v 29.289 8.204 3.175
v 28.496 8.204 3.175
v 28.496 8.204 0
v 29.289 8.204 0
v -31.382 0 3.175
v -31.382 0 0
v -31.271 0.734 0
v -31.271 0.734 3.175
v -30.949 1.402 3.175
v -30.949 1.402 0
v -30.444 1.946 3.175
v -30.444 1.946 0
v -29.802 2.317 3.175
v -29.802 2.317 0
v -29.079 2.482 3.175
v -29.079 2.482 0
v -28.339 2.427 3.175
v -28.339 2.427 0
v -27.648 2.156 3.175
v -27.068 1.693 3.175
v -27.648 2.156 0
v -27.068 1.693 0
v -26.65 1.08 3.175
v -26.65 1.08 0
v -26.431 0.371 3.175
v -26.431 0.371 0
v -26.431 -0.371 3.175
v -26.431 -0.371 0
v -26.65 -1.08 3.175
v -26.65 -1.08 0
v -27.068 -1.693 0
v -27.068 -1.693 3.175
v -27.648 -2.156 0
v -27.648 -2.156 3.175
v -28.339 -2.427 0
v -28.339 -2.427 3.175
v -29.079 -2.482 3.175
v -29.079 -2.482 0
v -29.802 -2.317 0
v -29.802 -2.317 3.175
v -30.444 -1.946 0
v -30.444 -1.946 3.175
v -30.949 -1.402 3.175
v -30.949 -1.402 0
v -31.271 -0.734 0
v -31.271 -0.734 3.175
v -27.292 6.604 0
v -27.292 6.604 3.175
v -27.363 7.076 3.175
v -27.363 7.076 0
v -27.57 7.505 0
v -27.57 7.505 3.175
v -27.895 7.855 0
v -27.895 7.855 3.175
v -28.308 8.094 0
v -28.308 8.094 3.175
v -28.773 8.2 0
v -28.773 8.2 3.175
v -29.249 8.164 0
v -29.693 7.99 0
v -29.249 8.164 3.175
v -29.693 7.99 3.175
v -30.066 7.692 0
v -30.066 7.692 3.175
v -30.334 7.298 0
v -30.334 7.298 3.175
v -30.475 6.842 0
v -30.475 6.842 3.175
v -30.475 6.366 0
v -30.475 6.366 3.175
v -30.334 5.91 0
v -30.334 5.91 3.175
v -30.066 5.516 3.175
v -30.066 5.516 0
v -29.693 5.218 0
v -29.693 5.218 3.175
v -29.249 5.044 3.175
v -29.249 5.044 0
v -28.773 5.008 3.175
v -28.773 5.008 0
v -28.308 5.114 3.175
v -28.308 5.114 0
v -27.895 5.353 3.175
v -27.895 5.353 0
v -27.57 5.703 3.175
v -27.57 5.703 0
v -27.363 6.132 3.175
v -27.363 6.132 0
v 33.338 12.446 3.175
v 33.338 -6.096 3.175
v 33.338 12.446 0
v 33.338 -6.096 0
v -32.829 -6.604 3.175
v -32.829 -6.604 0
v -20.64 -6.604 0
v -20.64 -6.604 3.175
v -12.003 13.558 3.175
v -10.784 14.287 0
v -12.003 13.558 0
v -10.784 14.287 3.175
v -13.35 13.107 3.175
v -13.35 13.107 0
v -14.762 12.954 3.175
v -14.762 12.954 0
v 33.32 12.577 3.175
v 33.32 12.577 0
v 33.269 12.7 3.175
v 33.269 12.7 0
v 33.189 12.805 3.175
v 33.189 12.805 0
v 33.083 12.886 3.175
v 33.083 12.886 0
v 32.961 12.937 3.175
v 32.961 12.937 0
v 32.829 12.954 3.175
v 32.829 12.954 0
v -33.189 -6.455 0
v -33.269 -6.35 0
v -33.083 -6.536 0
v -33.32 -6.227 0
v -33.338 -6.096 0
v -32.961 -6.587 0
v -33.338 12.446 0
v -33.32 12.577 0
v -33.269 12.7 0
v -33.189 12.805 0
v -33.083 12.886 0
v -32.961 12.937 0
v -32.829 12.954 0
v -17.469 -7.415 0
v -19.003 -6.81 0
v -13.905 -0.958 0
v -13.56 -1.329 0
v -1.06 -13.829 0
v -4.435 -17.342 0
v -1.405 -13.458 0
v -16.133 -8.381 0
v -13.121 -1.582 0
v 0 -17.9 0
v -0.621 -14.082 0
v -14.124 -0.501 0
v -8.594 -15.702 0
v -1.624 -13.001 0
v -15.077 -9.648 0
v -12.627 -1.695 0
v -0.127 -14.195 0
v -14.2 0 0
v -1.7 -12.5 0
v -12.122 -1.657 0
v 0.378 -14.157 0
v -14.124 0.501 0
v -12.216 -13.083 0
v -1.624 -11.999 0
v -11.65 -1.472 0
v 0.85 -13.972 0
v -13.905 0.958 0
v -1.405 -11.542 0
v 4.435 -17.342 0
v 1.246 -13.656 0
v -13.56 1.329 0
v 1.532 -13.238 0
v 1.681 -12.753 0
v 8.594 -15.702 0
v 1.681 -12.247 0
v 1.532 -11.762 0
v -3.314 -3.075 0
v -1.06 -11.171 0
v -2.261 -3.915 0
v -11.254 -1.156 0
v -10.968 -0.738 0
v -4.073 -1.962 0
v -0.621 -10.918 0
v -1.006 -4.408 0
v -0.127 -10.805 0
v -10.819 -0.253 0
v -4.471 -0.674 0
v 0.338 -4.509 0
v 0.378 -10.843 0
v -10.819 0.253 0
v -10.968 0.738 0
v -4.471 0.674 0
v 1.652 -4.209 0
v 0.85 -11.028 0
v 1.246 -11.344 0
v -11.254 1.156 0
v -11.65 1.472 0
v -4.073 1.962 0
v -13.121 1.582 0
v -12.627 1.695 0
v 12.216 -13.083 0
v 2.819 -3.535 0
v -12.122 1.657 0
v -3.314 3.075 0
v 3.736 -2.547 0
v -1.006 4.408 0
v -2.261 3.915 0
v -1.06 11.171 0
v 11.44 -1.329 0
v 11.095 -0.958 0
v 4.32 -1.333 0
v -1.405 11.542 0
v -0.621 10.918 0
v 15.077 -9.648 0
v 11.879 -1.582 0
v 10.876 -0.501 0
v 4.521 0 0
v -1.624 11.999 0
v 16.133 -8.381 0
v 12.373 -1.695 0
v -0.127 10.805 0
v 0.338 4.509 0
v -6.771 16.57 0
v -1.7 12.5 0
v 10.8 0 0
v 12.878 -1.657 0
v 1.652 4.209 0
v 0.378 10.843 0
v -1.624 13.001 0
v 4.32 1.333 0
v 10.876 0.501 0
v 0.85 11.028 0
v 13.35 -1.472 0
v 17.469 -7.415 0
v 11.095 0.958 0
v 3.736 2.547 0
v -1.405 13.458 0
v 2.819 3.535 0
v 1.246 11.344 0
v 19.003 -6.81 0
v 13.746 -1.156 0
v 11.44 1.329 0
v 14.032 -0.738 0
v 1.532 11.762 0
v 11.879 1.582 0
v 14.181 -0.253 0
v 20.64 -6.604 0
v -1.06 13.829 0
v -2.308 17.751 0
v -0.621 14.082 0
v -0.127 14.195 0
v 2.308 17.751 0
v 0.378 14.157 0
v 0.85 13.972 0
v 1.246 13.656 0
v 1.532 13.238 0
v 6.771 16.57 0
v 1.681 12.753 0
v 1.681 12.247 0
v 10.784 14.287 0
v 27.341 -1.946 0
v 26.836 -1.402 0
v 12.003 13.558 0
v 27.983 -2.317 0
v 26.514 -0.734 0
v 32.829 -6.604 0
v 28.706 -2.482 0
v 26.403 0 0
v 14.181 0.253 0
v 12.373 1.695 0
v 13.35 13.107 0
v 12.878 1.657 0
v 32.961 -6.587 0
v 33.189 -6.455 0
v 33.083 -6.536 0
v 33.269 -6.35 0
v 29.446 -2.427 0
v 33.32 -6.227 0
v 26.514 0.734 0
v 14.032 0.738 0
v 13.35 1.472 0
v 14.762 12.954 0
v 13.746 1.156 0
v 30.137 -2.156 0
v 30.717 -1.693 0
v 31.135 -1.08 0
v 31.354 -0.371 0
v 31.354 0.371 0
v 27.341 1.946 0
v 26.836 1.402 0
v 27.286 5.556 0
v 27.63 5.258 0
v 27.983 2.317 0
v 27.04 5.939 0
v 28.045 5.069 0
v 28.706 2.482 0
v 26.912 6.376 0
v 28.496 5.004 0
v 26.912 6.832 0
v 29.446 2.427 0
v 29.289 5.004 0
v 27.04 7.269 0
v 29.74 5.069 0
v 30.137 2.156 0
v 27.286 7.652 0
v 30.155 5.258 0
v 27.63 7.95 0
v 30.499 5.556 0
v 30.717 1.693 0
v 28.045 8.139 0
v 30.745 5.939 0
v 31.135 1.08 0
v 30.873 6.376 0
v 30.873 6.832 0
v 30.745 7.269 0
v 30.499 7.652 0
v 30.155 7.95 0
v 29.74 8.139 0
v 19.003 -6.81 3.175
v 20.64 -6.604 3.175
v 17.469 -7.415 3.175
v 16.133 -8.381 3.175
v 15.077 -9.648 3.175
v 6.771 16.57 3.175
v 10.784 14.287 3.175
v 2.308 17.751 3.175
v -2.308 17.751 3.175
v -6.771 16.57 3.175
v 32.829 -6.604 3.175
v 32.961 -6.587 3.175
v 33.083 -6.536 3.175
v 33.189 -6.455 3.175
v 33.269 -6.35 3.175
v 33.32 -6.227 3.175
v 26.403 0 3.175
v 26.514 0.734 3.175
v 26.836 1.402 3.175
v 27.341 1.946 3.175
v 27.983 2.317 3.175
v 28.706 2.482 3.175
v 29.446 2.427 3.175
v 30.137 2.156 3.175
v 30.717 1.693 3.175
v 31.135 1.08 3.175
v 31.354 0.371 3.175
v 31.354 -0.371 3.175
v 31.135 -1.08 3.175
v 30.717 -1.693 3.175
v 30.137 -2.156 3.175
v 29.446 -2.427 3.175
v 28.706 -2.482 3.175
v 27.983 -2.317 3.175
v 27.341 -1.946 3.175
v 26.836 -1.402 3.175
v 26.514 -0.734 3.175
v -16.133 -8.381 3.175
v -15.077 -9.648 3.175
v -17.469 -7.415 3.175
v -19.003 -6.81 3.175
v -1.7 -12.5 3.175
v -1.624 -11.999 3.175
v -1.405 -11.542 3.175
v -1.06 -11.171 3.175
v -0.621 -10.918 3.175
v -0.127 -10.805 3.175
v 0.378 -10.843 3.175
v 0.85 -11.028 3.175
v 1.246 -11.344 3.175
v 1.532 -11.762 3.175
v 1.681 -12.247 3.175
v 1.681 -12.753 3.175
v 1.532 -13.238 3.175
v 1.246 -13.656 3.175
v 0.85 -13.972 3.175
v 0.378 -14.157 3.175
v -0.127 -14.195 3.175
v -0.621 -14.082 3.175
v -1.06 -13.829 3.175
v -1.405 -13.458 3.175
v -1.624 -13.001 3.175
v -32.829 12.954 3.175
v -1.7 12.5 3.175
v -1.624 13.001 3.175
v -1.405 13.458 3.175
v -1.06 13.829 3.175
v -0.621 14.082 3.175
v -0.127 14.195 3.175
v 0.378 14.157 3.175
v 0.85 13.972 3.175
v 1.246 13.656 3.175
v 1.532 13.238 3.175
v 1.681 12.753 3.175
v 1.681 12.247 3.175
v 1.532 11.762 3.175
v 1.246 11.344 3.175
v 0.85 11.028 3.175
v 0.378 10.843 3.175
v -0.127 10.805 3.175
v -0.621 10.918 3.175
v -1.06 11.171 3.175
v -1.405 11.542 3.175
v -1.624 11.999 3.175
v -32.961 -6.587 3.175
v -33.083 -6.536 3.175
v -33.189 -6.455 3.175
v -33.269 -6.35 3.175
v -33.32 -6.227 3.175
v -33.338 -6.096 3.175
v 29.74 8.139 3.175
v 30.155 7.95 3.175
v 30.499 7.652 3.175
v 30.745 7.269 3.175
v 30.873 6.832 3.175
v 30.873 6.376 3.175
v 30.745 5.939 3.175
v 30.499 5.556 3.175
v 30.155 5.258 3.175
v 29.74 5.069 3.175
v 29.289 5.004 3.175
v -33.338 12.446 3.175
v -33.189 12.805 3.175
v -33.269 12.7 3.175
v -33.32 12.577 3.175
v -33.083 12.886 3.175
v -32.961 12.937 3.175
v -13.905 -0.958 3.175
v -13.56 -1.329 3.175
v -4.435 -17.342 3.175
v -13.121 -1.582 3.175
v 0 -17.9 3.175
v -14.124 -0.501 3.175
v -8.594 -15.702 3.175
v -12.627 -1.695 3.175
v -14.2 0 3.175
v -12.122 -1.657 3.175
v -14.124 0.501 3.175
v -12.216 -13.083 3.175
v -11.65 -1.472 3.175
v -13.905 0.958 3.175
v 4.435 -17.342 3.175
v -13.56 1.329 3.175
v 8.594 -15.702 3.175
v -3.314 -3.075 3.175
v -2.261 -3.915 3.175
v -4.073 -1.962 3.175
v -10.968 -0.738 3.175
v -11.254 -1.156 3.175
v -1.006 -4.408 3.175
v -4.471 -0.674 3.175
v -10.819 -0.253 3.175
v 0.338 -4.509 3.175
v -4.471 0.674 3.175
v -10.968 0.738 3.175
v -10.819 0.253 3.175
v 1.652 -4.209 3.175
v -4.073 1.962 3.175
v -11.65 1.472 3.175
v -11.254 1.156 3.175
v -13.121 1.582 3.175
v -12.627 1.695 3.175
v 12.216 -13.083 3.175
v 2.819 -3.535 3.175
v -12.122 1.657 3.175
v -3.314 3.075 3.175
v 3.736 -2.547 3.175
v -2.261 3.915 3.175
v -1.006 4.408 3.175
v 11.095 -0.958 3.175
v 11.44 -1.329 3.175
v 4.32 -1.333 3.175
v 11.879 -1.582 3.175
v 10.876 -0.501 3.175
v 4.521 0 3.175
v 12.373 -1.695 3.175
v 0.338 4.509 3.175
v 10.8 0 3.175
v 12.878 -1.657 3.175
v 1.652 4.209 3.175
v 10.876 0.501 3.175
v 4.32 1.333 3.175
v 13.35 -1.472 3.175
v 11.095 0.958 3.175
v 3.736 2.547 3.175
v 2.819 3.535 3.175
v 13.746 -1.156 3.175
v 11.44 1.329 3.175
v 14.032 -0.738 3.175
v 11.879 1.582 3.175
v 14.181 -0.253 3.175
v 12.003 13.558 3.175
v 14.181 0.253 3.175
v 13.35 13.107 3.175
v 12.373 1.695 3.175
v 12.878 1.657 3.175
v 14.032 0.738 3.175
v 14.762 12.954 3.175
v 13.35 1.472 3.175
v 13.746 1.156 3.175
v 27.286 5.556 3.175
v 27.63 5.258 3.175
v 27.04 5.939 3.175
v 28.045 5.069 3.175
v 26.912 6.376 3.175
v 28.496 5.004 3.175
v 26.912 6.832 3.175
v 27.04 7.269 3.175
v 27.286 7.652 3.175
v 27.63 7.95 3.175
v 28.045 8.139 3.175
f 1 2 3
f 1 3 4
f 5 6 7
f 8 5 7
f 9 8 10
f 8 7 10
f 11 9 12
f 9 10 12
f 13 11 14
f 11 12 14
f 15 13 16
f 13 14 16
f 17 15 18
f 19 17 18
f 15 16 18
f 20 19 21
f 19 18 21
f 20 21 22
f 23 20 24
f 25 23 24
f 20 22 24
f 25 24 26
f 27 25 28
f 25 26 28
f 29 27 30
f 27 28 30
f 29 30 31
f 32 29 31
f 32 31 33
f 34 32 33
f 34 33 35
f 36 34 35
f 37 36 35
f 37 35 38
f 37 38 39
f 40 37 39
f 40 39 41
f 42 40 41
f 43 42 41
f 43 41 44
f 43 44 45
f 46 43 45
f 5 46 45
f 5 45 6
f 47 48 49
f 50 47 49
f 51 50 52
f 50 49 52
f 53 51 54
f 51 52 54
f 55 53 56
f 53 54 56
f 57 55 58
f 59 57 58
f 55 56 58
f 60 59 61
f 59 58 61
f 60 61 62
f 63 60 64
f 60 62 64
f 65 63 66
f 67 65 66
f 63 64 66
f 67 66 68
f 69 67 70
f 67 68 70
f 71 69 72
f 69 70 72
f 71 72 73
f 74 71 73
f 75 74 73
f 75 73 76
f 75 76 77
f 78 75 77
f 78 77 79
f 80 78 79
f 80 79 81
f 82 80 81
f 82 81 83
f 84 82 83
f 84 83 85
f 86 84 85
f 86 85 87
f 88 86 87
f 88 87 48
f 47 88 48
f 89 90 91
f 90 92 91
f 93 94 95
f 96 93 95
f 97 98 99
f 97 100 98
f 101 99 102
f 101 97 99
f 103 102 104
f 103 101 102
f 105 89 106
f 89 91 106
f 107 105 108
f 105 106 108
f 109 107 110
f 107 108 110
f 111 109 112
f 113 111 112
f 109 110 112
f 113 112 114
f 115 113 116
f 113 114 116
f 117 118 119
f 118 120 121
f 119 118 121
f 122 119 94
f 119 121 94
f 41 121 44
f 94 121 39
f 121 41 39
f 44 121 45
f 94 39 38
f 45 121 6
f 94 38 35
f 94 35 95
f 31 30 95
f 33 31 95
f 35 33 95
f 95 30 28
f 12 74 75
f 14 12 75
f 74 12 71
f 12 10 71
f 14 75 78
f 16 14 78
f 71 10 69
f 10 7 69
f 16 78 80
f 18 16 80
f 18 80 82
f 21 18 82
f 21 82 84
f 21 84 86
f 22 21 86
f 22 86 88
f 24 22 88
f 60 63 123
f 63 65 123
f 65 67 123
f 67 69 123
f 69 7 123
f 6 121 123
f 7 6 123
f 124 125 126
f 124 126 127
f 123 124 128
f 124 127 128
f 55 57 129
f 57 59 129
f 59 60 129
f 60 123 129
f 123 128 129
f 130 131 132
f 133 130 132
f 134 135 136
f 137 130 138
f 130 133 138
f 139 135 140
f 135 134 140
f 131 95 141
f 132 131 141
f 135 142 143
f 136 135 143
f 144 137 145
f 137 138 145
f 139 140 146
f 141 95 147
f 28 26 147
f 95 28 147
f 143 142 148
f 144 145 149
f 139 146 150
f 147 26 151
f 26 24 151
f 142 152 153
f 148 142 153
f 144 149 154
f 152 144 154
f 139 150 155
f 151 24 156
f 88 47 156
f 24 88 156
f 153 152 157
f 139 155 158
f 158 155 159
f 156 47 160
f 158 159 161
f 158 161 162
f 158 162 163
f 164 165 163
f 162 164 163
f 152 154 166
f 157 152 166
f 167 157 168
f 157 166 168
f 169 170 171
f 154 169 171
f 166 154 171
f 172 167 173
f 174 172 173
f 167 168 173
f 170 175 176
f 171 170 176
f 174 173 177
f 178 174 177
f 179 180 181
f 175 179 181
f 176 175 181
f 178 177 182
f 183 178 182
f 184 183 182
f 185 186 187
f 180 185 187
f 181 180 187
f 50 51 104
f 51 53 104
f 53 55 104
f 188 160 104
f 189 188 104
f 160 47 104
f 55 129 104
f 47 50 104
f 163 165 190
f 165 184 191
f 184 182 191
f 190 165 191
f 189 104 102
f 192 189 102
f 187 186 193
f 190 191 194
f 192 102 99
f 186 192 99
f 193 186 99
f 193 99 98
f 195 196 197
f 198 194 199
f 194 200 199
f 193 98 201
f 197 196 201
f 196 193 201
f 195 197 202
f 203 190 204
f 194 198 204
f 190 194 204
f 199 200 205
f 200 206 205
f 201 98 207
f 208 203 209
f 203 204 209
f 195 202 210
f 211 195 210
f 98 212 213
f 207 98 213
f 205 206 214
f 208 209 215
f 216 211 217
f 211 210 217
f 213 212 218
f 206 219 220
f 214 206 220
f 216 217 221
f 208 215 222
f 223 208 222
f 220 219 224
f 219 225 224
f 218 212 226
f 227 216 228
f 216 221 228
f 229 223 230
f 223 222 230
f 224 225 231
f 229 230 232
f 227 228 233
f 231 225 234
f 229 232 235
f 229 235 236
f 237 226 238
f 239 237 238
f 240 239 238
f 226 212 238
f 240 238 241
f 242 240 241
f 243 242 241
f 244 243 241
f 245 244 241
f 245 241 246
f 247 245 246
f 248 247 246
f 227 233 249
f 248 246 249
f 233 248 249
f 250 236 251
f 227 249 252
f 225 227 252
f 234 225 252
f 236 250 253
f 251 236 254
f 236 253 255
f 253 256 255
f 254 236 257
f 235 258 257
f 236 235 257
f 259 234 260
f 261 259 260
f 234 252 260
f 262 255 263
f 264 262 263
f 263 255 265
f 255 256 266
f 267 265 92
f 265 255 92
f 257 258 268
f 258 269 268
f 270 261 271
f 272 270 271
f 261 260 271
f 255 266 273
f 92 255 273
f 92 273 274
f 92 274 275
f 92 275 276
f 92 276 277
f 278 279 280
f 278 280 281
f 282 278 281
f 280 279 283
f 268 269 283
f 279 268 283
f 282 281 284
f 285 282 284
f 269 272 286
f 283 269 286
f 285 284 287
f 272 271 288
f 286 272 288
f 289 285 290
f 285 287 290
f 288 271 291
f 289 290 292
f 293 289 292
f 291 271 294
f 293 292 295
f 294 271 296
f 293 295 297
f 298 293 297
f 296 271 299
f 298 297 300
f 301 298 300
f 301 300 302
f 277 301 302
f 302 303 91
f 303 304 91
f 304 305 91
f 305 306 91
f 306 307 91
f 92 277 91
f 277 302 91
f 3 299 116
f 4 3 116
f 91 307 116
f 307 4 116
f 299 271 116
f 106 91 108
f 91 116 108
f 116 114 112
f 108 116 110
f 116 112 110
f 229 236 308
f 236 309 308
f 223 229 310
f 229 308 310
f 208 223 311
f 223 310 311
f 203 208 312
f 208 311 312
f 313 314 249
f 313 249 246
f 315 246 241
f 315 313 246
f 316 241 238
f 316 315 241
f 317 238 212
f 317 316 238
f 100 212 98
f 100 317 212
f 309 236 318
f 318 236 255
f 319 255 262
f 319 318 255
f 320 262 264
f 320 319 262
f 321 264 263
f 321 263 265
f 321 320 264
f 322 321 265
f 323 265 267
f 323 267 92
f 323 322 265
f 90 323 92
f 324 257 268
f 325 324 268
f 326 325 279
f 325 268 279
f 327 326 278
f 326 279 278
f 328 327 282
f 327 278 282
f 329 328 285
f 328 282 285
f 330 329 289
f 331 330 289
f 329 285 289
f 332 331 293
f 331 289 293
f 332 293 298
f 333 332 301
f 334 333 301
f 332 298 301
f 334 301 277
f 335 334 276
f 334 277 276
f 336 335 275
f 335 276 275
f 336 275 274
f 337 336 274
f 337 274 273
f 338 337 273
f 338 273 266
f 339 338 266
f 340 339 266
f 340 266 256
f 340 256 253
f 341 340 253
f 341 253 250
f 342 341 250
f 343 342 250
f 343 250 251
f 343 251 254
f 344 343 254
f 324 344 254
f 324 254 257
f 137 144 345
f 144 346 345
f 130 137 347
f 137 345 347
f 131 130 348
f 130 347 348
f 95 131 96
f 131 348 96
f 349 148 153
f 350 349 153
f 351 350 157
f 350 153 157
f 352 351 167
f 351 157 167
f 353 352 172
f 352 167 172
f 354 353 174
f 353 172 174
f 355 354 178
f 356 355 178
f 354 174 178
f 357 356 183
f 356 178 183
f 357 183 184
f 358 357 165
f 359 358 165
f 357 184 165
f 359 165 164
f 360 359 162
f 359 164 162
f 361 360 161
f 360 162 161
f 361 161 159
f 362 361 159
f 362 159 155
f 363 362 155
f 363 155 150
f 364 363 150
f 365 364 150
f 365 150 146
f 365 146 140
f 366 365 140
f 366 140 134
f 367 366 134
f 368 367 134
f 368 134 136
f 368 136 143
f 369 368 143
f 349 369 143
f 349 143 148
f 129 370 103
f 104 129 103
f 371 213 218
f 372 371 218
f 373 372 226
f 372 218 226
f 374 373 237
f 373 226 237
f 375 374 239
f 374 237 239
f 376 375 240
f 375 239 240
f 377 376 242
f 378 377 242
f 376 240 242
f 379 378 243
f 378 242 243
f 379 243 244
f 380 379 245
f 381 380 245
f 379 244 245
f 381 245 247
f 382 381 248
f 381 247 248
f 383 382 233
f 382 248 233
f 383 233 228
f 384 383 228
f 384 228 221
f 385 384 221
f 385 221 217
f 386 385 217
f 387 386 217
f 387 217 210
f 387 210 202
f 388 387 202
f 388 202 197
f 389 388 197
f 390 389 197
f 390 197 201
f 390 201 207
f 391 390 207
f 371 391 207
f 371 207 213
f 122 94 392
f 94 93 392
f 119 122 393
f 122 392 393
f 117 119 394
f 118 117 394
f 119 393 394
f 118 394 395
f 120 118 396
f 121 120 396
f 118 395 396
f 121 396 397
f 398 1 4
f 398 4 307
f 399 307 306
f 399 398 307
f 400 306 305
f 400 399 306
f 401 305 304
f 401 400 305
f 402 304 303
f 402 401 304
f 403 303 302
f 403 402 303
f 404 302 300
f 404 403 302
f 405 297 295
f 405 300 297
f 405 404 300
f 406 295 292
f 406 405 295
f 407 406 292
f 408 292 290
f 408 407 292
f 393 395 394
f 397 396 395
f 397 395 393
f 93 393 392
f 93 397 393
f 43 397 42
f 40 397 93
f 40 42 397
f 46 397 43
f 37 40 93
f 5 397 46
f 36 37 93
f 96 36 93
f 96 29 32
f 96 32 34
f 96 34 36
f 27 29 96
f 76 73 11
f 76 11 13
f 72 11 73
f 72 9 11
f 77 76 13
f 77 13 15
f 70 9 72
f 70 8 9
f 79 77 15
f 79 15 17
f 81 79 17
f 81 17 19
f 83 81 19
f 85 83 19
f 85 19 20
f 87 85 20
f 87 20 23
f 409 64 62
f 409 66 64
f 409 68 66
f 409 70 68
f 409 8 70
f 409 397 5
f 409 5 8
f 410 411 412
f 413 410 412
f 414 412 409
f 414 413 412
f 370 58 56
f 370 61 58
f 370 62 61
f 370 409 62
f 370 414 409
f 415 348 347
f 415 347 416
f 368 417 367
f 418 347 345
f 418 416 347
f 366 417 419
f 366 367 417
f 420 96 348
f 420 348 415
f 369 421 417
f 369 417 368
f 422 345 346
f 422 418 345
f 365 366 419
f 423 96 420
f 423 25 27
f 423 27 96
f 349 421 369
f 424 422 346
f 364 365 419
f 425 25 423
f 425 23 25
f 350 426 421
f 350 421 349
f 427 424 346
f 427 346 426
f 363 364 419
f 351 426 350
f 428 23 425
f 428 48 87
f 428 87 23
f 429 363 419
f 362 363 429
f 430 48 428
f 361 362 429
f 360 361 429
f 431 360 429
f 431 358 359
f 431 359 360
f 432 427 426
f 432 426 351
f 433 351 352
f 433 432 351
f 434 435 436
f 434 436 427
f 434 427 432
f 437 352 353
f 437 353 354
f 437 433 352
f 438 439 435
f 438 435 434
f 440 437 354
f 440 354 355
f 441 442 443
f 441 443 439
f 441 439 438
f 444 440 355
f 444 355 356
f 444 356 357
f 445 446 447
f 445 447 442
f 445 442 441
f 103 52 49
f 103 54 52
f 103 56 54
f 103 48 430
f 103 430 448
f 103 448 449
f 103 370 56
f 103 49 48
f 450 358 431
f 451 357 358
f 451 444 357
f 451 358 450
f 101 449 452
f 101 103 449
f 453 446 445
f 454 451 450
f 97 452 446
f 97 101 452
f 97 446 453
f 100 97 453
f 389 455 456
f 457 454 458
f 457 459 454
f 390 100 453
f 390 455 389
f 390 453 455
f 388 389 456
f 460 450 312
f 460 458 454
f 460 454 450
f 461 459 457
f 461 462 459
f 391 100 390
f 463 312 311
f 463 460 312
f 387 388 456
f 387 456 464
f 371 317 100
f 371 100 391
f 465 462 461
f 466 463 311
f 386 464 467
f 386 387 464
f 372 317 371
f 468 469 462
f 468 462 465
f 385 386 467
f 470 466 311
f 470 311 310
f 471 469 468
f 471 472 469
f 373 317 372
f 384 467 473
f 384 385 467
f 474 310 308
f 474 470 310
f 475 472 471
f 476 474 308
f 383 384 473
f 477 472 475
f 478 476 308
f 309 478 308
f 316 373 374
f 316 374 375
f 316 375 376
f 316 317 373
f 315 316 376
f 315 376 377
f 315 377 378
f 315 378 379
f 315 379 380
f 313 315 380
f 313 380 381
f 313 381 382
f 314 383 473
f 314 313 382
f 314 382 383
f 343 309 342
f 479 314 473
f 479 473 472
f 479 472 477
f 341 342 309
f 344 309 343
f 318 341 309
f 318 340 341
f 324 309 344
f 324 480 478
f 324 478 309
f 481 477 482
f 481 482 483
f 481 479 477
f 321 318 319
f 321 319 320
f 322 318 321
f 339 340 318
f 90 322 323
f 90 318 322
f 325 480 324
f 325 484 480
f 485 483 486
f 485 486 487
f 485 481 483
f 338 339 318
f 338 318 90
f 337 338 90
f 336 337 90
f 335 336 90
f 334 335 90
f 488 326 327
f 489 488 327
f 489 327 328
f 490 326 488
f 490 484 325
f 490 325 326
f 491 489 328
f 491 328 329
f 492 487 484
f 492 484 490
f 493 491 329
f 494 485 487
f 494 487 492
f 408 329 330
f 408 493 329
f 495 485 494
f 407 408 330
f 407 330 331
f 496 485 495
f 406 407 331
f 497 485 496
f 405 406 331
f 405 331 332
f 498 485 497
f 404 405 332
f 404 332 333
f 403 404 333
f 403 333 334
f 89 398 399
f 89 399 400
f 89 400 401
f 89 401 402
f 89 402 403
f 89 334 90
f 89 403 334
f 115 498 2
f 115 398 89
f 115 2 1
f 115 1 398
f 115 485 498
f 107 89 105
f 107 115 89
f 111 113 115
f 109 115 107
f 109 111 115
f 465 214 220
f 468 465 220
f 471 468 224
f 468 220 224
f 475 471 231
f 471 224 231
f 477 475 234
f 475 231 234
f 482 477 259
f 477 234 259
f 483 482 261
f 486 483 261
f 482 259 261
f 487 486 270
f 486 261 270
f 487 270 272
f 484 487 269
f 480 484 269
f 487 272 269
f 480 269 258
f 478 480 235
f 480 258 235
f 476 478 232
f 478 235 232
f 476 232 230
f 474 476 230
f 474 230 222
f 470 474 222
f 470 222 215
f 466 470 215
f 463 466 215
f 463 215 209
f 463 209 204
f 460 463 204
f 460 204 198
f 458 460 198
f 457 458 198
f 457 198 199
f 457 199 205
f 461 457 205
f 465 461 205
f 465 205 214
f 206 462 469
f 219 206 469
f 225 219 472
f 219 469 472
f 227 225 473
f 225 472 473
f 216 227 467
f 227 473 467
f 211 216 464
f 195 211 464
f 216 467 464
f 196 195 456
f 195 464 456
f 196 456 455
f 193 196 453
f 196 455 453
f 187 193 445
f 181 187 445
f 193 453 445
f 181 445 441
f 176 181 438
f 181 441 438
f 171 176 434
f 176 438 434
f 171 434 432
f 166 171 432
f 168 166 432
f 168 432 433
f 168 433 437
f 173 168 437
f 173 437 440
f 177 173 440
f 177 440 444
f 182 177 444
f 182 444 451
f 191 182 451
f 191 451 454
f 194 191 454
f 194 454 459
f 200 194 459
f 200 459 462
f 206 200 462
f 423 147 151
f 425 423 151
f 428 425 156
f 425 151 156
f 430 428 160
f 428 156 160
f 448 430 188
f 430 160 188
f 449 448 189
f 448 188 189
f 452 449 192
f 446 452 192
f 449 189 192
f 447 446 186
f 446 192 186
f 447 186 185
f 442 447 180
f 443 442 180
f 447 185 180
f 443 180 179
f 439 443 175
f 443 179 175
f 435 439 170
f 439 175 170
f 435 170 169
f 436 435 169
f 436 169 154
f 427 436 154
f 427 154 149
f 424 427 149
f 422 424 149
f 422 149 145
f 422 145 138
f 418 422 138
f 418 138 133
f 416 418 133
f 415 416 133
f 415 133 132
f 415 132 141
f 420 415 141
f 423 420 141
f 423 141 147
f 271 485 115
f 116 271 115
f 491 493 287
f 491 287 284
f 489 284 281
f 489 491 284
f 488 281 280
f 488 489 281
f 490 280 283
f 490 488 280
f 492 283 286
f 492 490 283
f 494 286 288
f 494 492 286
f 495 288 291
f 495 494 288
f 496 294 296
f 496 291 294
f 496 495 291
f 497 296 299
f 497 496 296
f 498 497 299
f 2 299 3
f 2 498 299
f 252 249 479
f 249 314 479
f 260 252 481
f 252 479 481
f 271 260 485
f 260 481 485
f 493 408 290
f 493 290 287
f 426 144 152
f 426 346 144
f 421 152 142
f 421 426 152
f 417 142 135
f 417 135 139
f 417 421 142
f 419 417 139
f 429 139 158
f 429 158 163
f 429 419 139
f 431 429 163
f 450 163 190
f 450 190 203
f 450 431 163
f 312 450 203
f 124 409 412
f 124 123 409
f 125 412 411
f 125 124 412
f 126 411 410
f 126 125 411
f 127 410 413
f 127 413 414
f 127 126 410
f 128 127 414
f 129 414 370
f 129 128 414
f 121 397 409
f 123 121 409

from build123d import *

# Parameters (mm, degrees)
SKETCH1_W              = 66.675
SKETCH1_H              = 13.208
BOSS_EXTRUDE1_DEPTH    = 3.175
SKETCH2_R              = 17.9
BOSS_EXTRUDE2_DEPTH    = 3.175
SKETCH8_W              = 66.675
SKETCH8_H              = 6.35
BOSS_EXTRUDE3_DEPTH    = 3.175
FILLET1_R              = 6.604
FILLET2_R              = 0.508
F_10_CLEARANCE_HOLE1_D = 4.9784
SKETCH5_R              = 4.5212
CUT_EXTRUDE1_DEPTH     = 38.972088845
M3_CLEARANCE_HOLE1_D   = 3.4
SKETCH9_R              = 1.6002
CUT_EXTRUDE2_DEPTH     = 38.972088845


with BuildPart() as part:
    # Sketch1 → Boss-Extrude1 (new body)
    with BuildSketch(Plane.XY):
        Rectangle(SKETCH1_W, SKETCH1_H)
    extrude(amount=BOSS_EXTRUDE1_DEPTH)

    # Sketch2 → Boss-Extrude2 (add, through all)
    with BuildSketch(Plane.XY.offset(3.175)):
        Circle(SKETCH2_R)
    extrude(amount=-BOSS_EXTRUDE2_DEPTH)

    # Sketch8 → Boss-Extrude3 (add, through all)
    with BuildSketch(Plane.XY.offset(3.175)):
        with Locations((0, 9.779)):
            Rectangle(SKETCH8_W, SKETCH8_H)
    extrude(amount=-BOSS_EXTRUDE3_DEPTH)

    # Fillet1
    fillet1_edges = [part.edges().sort_by_distance(p)[0] for p in [
        (-16.637222845, -6.604, 1.5875),
        (16.637222845, -6.604, 1.5875),
        (12.353294459, 12.954, 1.5875),
        (-12.353294459, 12.954, 1.5875),
    ]]
    fillet(fillet1_edges, radius=FILLET1_R)

    # Fillet2
    fillet2_edges = [part.edges().sort_by_distance(p)[0] for p in [
        (-33.3375, 12.954, 1.5875),
        (33.3375, 12.954, 1.5875),
        (33.3375, -6.604, 1.5875),
        (-33.3375, -6.604, 1.5875),
    ]]
    fillet(fillet2_edges, radius=FILLET2_R)

    # #10 Clearance Hole1 (through all)
    with Locations(Plane.XY.offset(3.175)):
        with Locations((28.8925, 0), (-28.8925, 0)):
            Hole(F_10_CLEARANCE_HOLE1_D / 2)

    # Sketch5 → Cut-Extrude1 (cut, through all)
    with BuildSketch(Plane.XY.offset(3.175)):
        Circle(SKETCH5_R)
    extrude(amount=-CUT_EXTRUDE1_DEPTH, mode=Mode.SUBTRACT)

    # M3 Clearance Hole1 (through all)
    with Locations(Plane.XY.offset(3.175)):
        with Locations((0, 12.5), (-12.5, 0), (0, -12.5), (12.5, 0)):
            Hole(M3_CLEARANCE_HOLE1_D / 2)

    # Sketch9 → Cut-Extrude2 (cut, through all)
    with BuildSketch(Plane.XY.offset(3.175)):
        with Locations((-28.8925, 6.604)):
            Circle(SKETCH9_R)
        with BuildLine():
            Line((28.495625, 8.2042), (29.289375, 8.2042))
            ThreePointArc((29.289375, 8.2042), (30.889575, 6.604), (29.289375, 5.0038))
            Line((29.289375, 5.0038), (28.495625, 5.0038))
            ThreePointArc((28.495625, 5.0038), (26.895425, 6.604), (28.495625, 8.2042))
        make_face()
    extrude(amount=-CUT_EXTRUDE2_DEPTH, mode=Mode.SUBTRACT)


solid = part.part
